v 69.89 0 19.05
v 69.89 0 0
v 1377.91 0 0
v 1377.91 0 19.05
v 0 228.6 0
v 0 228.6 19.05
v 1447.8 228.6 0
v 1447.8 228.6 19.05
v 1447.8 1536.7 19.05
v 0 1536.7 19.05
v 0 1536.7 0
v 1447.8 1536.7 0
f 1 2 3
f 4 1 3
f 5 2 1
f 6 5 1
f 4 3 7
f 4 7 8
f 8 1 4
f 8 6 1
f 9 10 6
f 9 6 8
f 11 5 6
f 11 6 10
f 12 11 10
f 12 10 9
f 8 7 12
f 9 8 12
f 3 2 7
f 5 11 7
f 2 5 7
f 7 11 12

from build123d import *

# Parameters (mm, degrees)
F0_W       = 1447.8
F0_H       = 1536.7
F1_DEPTH   = 19.05
F2_SIZE2   = 69.8900337814
F2_SIZE    = 228.6
F2_2_SIZE2 = 69.8900337814
F2_2_SIZE  = 228.6


with BuildPart() as f1:
    # F0 (on Top) → F1 (new body)
    with BuildSketch(Plane.XY):
        with Locations((723.9, 768.35)):
            Rectangle(F0_W, F0_H)
    extrude(amount=F1_DEPTH)

    # F2
    f2_edges = [f1.edges().sort_by_distance(p)[0] for p in [
        (1447.8, 0, 9.525),
    ]]
    f2_side = f1.faces().sort_by_distance((1447.8, 768.35, 9.525))[0]
    chamfer(f2_edges, length=F2_SIZE, length2=F2_SIZE2, reference=f2_side)

    # F2#2
    f2_2_edges = [f1.edges().sort_by_distance(p)[0] for p in [
        (0, 0, 9.525),
    ]]
    f2_2_side = f1.faces().sort_by_distance((0, 768.35, 9.525))[0]
    chamfer(f2_2_edges, length=F2_2_SIZE, length2=F2_2_SIZE2, reference=f2_2_side)


solid = f1.part
